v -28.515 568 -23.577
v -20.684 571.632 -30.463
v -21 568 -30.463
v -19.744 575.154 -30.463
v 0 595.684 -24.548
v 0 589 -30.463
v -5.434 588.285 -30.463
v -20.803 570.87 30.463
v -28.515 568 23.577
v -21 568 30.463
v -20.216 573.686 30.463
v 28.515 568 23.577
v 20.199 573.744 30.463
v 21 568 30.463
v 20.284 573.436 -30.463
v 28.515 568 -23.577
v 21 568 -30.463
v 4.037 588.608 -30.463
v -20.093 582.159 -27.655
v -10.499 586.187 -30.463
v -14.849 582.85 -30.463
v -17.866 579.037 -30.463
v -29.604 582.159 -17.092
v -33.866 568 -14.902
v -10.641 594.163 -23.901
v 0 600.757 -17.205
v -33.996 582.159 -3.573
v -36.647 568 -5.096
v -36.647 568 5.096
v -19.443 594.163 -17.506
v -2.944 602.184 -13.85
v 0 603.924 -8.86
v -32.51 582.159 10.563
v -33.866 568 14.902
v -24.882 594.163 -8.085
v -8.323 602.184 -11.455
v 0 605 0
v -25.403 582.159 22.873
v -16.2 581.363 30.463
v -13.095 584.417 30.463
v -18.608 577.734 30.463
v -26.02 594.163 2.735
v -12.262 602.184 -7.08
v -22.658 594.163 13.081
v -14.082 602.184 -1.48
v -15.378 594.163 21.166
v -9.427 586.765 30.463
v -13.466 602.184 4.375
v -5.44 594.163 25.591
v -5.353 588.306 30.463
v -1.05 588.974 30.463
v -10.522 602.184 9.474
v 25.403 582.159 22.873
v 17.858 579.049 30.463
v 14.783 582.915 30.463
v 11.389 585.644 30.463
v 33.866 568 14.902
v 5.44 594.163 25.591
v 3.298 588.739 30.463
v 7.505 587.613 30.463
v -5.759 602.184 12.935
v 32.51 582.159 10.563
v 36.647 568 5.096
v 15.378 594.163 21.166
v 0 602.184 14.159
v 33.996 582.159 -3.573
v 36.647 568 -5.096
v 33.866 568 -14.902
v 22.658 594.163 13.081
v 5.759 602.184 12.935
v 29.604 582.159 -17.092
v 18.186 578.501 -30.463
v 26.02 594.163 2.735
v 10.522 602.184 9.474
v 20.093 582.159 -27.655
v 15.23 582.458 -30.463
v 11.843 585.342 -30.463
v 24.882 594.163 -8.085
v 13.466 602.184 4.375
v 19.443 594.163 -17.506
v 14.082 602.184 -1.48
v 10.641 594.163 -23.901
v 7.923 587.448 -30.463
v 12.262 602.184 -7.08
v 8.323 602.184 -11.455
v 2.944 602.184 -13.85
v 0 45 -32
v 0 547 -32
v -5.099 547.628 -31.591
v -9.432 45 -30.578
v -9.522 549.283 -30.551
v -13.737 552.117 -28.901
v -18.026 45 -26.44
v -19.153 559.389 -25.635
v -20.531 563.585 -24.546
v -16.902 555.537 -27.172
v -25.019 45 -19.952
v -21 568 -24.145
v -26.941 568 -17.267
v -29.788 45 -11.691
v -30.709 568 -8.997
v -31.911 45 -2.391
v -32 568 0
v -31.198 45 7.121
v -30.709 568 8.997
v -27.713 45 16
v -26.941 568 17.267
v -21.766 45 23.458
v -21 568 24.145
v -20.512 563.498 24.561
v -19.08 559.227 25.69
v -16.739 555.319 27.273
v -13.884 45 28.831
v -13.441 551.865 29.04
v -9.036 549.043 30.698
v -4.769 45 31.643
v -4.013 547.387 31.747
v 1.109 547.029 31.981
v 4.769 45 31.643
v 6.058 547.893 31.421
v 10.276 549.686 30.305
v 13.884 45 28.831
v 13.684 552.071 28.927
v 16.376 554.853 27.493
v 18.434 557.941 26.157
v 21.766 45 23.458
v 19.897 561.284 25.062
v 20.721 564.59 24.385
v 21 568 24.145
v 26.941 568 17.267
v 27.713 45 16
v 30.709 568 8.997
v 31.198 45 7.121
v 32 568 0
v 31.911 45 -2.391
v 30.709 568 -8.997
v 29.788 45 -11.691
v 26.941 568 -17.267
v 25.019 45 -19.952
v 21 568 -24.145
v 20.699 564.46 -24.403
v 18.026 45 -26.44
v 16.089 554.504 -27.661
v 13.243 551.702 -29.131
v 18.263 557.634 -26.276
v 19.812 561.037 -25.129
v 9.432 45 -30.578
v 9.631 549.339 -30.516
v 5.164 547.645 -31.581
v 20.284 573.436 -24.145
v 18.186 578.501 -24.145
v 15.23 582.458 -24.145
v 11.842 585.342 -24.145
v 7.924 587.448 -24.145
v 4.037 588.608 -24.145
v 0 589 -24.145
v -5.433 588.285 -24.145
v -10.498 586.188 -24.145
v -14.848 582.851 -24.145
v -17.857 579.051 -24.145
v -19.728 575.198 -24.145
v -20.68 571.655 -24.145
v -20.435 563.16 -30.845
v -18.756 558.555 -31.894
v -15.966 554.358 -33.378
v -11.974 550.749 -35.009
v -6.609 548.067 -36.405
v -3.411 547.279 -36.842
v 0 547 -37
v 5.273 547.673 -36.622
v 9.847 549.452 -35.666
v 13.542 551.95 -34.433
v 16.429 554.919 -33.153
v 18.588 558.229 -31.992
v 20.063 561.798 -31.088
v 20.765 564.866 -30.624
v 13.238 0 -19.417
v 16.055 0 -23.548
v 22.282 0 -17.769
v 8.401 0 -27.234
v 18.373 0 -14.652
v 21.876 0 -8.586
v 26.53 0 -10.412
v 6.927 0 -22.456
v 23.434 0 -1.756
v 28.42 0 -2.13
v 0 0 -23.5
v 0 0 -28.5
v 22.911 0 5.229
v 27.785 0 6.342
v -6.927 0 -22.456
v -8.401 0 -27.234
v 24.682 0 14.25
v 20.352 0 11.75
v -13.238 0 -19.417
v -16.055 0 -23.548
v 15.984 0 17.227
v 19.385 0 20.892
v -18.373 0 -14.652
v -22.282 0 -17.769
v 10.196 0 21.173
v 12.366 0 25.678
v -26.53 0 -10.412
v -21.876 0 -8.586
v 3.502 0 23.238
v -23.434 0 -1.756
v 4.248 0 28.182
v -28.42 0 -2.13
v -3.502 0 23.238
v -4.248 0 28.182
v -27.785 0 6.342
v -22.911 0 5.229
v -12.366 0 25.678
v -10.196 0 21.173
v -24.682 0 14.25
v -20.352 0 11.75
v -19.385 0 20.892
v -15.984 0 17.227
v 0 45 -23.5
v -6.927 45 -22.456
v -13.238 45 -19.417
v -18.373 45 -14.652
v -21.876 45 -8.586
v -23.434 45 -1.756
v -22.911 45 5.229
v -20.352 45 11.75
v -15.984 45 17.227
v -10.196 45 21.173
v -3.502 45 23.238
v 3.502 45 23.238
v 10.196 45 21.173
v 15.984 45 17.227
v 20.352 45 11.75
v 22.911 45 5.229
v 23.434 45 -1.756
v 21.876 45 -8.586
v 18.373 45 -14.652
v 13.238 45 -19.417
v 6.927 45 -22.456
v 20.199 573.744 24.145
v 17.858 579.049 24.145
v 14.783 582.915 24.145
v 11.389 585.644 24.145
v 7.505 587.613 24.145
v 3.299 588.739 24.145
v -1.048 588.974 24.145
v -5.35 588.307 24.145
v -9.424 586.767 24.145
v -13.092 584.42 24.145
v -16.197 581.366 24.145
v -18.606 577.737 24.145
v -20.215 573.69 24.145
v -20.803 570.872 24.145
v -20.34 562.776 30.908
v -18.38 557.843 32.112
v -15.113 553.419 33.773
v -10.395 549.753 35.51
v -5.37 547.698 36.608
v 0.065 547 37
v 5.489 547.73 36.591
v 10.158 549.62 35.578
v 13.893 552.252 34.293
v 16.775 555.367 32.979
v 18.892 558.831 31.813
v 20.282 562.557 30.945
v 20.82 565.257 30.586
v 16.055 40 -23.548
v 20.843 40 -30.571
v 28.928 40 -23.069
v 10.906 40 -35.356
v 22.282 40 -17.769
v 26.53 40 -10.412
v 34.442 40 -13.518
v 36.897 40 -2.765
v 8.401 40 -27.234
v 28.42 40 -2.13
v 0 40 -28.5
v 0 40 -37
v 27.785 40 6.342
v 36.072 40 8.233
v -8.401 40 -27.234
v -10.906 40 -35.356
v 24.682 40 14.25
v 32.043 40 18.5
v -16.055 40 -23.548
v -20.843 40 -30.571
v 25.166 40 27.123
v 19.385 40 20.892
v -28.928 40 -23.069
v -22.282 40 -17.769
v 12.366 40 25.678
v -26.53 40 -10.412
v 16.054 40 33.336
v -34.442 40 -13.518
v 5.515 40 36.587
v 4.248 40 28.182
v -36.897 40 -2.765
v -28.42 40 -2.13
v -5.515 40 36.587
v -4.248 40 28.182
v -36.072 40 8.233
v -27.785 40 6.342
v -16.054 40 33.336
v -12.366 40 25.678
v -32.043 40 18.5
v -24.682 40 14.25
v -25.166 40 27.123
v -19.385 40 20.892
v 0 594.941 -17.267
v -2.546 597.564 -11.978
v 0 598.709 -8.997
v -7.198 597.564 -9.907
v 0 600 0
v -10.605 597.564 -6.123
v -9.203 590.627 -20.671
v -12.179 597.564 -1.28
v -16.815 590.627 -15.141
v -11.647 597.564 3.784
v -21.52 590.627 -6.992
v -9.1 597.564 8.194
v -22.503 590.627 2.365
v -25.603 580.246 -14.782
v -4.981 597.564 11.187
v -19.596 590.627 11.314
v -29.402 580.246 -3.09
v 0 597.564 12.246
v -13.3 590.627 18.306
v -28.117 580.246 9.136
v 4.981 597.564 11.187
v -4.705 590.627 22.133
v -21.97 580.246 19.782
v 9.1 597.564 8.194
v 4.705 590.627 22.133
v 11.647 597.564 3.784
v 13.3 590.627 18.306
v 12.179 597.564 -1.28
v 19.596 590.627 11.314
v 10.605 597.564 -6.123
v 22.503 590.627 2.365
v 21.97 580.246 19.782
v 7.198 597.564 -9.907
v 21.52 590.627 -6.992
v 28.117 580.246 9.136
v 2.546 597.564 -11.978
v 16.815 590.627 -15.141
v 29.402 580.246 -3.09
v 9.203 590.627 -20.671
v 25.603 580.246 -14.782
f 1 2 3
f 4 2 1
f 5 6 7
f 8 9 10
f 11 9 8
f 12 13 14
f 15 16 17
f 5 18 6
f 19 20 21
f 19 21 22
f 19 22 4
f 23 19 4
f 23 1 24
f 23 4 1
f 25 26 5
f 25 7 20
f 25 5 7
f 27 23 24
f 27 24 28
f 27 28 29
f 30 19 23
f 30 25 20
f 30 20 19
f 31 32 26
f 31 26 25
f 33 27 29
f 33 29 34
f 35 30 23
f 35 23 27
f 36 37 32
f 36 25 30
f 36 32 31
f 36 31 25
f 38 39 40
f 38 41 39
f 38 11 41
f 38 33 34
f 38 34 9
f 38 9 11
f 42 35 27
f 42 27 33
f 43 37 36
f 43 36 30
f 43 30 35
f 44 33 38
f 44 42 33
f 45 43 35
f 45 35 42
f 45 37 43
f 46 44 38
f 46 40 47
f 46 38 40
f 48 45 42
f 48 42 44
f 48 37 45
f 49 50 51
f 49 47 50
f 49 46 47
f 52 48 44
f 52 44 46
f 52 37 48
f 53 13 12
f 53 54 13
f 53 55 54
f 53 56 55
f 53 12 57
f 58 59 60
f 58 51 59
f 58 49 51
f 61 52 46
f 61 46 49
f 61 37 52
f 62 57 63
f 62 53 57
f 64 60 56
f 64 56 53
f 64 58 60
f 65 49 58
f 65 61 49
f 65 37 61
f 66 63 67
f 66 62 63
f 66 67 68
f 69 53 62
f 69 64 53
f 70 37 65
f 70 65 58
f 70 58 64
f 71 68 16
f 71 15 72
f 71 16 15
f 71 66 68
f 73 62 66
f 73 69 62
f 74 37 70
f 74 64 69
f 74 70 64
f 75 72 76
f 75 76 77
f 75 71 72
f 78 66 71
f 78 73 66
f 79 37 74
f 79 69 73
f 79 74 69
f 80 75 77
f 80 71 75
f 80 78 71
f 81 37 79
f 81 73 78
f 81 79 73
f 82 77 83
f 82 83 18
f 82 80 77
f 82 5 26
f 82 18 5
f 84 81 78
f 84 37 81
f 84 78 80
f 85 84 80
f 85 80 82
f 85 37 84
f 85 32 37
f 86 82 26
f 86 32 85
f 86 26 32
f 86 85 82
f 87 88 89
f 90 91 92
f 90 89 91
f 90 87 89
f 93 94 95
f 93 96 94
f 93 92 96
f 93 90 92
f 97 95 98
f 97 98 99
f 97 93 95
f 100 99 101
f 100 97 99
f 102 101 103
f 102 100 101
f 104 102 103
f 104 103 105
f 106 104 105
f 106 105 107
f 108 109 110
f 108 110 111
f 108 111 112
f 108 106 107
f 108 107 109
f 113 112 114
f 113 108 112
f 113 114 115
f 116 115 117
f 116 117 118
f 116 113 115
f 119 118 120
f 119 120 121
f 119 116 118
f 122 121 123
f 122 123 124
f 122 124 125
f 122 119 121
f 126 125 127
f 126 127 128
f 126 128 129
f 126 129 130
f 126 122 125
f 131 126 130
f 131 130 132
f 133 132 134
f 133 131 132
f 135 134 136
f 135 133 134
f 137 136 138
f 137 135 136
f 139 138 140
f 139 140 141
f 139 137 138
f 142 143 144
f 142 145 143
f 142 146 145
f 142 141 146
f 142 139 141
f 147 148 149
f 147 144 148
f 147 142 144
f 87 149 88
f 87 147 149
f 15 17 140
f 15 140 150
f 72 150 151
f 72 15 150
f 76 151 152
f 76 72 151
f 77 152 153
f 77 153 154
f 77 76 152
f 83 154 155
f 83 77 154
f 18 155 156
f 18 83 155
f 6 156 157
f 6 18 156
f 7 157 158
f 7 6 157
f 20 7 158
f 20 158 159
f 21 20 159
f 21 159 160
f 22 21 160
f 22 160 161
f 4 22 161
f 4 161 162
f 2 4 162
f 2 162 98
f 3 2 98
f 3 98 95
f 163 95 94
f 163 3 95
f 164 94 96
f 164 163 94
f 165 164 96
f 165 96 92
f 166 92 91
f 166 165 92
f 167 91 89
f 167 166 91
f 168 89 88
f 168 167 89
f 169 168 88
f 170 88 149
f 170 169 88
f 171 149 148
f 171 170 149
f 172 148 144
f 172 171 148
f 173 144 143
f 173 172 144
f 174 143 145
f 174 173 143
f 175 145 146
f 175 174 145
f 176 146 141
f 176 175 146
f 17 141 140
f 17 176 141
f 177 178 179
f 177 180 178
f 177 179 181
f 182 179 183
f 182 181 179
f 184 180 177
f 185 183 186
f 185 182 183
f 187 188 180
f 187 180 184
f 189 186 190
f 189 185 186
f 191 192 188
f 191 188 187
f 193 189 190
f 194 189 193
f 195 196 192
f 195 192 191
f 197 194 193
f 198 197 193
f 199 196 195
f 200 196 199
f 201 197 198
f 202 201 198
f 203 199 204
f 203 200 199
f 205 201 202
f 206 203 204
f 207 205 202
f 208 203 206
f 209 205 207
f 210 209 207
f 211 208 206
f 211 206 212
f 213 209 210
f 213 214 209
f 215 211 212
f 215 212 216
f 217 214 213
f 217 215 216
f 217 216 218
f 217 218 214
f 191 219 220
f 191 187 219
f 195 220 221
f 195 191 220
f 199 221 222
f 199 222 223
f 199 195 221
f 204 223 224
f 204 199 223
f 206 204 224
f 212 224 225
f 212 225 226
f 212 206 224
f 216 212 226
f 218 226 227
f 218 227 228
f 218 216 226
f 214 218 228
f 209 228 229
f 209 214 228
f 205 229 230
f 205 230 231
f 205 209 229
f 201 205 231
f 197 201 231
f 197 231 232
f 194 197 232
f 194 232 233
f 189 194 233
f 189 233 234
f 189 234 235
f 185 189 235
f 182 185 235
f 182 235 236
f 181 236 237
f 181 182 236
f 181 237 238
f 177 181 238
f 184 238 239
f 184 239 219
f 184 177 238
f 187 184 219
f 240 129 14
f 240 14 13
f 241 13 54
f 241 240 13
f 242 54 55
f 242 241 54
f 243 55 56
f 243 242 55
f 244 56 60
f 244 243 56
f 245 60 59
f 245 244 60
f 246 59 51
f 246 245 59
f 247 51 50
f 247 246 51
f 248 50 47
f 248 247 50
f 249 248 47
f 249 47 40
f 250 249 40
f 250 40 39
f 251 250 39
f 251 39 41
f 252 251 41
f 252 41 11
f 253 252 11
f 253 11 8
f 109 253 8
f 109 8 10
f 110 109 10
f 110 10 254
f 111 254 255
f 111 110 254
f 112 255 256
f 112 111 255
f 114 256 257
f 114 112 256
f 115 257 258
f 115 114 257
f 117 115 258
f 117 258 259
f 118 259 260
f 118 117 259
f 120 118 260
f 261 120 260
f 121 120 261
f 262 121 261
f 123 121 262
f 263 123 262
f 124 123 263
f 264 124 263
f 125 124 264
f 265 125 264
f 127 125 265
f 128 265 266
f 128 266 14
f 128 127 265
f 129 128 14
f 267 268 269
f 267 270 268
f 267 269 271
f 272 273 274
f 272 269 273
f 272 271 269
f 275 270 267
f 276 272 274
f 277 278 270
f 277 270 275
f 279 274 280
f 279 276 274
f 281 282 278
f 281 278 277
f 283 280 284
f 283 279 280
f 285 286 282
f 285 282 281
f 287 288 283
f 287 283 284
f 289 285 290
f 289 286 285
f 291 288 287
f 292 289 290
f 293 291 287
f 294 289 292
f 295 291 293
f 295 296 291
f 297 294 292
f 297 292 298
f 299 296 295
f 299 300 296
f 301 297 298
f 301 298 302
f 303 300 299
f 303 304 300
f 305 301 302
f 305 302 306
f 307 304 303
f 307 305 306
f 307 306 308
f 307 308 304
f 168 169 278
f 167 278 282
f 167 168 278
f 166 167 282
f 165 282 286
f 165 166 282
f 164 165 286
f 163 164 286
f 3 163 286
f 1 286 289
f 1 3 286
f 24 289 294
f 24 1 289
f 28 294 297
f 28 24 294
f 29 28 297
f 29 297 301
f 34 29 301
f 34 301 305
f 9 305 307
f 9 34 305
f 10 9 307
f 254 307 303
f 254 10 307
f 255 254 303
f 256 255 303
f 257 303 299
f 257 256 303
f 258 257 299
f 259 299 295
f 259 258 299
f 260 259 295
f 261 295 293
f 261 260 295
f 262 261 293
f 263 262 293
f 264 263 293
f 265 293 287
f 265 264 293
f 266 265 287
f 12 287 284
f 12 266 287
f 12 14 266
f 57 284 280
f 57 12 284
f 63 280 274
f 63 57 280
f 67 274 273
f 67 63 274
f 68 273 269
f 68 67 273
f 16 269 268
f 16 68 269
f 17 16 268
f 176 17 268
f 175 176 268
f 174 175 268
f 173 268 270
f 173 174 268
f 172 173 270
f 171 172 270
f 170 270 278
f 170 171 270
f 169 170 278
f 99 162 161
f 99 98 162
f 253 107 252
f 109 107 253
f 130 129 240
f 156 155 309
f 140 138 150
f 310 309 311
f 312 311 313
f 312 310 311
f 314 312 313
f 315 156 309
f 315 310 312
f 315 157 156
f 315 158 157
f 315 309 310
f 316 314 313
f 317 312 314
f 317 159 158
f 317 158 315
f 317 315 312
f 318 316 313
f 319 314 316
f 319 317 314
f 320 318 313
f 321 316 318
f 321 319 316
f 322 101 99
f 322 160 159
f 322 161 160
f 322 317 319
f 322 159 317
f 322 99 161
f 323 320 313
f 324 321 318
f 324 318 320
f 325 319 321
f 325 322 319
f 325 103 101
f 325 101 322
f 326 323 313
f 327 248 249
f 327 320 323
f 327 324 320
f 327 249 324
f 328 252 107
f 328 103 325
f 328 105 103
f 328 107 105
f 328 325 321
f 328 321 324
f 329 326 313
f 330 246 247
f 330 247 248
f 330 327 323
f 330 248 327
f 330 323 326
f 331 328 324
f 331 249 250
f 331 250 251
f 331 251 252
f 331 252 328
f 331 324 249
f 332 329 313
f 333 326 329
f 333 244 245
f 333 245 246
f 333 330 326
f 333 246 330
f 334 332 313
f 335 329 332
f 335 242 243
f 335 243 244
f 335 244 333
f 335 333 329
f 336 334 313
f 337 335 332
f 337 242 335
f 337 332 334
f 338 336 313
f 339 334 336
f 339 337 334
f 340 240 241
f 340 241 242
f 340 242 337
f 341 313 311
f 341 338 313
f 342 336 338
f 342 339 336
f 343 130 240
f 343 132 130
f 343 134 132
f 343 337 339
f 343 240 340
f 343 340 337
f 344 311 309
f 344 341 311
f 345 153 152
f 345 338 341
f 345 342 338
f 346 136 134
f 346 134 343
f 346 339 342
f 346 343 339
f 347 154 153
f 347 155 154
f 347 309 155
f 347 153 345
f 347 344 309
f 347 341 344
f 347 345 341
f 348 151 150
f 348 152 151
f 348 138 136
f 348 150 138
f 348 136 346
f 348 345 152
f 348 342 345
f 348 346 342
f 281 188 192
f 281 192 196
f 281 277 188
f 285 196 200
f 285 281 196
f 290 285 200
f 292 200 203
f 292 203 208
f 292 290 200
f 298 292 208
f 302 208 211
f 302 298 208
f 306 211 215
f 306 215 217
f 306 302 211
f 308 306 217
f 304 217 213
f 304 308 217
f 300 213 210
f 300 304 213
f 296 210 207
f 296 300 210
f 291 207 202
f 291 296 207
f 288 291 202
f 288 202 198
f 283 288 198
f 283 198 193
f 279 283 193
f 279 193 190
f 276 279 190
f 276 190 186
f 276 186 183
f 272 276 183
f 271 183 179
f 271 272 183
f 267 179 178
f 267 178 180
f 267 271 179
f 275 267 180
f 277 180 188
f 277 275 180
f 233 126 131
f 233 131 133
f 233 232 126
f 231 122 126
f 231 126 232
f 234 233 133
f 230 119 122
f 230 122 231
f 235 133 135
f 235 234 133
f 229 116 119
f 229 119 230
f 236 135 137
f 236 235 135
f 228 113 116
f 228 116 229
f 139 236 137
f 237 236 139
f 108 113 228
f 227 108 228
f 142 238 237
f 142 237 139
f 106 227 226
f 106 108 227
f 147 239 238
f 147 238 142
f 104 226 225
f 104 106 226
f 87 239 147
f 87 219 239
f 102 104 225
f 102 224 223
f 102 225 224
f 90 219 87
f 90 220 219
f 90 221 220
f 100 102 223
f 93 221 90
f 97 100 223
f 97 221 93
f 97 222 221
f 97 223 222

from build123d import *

# Parameters (mm, degrees)
CUT_EXTRUDE1_DEPTH      = 608.258594011
CUT_EXTRUDE1_DEPTH_BACK = 608.258594011
SKETCH2_R               = 21


with BuildPart() as part:
    # Sketch1 → Revolve1 (revolve)
    with BuildSketch(Plane.XY, mode=Mode.PRIVATE) as revolve1_sk:
        with BuildLine():
            Line((23.5, 0), (28.5, 0))
            Line((28.5, 0), (28.5, 40))
            Line((28.5, 40), (37, 40))
            Line((37, 40), (37, 568))
            ThreePointArc((37, 568), (26.162950904, 594.162950904), (0, 605))
            Line((0, 605), (0, 600))
            ThreePointArc((0, 600), (22.627416998, 590.627416998), (32, 568))
            Line((32, 568), (32, 45))
            Line((32, 45), (23.5, 45))
            Line((23.5, 45), (23.5, 0))
        make_face()
    revolve(revolve1_sk.sketch.rotate(Axis((0, 0, 0), (0, 1, 0)), 90), axis=Axis((0, 0, 0), (0, 1, 0)))

    # Sketch2 → Cut-Extrude1 (cut, two sides: drawn at the far end of the back side and taken through both)
    with BuildSketch(Plane.XY.offset(-CUT_EXTRUDE1_DEPTH_BACK)):
        with Locations((0, 568)):
            Circle(SKETCH2_R)
    extrude(amount=CUT_EXTRUDE1_DEPTH + CUT_EXTRUDE1_DEPTH_BACK, mode=Mode.SUBTRACT)


solid = part.part
